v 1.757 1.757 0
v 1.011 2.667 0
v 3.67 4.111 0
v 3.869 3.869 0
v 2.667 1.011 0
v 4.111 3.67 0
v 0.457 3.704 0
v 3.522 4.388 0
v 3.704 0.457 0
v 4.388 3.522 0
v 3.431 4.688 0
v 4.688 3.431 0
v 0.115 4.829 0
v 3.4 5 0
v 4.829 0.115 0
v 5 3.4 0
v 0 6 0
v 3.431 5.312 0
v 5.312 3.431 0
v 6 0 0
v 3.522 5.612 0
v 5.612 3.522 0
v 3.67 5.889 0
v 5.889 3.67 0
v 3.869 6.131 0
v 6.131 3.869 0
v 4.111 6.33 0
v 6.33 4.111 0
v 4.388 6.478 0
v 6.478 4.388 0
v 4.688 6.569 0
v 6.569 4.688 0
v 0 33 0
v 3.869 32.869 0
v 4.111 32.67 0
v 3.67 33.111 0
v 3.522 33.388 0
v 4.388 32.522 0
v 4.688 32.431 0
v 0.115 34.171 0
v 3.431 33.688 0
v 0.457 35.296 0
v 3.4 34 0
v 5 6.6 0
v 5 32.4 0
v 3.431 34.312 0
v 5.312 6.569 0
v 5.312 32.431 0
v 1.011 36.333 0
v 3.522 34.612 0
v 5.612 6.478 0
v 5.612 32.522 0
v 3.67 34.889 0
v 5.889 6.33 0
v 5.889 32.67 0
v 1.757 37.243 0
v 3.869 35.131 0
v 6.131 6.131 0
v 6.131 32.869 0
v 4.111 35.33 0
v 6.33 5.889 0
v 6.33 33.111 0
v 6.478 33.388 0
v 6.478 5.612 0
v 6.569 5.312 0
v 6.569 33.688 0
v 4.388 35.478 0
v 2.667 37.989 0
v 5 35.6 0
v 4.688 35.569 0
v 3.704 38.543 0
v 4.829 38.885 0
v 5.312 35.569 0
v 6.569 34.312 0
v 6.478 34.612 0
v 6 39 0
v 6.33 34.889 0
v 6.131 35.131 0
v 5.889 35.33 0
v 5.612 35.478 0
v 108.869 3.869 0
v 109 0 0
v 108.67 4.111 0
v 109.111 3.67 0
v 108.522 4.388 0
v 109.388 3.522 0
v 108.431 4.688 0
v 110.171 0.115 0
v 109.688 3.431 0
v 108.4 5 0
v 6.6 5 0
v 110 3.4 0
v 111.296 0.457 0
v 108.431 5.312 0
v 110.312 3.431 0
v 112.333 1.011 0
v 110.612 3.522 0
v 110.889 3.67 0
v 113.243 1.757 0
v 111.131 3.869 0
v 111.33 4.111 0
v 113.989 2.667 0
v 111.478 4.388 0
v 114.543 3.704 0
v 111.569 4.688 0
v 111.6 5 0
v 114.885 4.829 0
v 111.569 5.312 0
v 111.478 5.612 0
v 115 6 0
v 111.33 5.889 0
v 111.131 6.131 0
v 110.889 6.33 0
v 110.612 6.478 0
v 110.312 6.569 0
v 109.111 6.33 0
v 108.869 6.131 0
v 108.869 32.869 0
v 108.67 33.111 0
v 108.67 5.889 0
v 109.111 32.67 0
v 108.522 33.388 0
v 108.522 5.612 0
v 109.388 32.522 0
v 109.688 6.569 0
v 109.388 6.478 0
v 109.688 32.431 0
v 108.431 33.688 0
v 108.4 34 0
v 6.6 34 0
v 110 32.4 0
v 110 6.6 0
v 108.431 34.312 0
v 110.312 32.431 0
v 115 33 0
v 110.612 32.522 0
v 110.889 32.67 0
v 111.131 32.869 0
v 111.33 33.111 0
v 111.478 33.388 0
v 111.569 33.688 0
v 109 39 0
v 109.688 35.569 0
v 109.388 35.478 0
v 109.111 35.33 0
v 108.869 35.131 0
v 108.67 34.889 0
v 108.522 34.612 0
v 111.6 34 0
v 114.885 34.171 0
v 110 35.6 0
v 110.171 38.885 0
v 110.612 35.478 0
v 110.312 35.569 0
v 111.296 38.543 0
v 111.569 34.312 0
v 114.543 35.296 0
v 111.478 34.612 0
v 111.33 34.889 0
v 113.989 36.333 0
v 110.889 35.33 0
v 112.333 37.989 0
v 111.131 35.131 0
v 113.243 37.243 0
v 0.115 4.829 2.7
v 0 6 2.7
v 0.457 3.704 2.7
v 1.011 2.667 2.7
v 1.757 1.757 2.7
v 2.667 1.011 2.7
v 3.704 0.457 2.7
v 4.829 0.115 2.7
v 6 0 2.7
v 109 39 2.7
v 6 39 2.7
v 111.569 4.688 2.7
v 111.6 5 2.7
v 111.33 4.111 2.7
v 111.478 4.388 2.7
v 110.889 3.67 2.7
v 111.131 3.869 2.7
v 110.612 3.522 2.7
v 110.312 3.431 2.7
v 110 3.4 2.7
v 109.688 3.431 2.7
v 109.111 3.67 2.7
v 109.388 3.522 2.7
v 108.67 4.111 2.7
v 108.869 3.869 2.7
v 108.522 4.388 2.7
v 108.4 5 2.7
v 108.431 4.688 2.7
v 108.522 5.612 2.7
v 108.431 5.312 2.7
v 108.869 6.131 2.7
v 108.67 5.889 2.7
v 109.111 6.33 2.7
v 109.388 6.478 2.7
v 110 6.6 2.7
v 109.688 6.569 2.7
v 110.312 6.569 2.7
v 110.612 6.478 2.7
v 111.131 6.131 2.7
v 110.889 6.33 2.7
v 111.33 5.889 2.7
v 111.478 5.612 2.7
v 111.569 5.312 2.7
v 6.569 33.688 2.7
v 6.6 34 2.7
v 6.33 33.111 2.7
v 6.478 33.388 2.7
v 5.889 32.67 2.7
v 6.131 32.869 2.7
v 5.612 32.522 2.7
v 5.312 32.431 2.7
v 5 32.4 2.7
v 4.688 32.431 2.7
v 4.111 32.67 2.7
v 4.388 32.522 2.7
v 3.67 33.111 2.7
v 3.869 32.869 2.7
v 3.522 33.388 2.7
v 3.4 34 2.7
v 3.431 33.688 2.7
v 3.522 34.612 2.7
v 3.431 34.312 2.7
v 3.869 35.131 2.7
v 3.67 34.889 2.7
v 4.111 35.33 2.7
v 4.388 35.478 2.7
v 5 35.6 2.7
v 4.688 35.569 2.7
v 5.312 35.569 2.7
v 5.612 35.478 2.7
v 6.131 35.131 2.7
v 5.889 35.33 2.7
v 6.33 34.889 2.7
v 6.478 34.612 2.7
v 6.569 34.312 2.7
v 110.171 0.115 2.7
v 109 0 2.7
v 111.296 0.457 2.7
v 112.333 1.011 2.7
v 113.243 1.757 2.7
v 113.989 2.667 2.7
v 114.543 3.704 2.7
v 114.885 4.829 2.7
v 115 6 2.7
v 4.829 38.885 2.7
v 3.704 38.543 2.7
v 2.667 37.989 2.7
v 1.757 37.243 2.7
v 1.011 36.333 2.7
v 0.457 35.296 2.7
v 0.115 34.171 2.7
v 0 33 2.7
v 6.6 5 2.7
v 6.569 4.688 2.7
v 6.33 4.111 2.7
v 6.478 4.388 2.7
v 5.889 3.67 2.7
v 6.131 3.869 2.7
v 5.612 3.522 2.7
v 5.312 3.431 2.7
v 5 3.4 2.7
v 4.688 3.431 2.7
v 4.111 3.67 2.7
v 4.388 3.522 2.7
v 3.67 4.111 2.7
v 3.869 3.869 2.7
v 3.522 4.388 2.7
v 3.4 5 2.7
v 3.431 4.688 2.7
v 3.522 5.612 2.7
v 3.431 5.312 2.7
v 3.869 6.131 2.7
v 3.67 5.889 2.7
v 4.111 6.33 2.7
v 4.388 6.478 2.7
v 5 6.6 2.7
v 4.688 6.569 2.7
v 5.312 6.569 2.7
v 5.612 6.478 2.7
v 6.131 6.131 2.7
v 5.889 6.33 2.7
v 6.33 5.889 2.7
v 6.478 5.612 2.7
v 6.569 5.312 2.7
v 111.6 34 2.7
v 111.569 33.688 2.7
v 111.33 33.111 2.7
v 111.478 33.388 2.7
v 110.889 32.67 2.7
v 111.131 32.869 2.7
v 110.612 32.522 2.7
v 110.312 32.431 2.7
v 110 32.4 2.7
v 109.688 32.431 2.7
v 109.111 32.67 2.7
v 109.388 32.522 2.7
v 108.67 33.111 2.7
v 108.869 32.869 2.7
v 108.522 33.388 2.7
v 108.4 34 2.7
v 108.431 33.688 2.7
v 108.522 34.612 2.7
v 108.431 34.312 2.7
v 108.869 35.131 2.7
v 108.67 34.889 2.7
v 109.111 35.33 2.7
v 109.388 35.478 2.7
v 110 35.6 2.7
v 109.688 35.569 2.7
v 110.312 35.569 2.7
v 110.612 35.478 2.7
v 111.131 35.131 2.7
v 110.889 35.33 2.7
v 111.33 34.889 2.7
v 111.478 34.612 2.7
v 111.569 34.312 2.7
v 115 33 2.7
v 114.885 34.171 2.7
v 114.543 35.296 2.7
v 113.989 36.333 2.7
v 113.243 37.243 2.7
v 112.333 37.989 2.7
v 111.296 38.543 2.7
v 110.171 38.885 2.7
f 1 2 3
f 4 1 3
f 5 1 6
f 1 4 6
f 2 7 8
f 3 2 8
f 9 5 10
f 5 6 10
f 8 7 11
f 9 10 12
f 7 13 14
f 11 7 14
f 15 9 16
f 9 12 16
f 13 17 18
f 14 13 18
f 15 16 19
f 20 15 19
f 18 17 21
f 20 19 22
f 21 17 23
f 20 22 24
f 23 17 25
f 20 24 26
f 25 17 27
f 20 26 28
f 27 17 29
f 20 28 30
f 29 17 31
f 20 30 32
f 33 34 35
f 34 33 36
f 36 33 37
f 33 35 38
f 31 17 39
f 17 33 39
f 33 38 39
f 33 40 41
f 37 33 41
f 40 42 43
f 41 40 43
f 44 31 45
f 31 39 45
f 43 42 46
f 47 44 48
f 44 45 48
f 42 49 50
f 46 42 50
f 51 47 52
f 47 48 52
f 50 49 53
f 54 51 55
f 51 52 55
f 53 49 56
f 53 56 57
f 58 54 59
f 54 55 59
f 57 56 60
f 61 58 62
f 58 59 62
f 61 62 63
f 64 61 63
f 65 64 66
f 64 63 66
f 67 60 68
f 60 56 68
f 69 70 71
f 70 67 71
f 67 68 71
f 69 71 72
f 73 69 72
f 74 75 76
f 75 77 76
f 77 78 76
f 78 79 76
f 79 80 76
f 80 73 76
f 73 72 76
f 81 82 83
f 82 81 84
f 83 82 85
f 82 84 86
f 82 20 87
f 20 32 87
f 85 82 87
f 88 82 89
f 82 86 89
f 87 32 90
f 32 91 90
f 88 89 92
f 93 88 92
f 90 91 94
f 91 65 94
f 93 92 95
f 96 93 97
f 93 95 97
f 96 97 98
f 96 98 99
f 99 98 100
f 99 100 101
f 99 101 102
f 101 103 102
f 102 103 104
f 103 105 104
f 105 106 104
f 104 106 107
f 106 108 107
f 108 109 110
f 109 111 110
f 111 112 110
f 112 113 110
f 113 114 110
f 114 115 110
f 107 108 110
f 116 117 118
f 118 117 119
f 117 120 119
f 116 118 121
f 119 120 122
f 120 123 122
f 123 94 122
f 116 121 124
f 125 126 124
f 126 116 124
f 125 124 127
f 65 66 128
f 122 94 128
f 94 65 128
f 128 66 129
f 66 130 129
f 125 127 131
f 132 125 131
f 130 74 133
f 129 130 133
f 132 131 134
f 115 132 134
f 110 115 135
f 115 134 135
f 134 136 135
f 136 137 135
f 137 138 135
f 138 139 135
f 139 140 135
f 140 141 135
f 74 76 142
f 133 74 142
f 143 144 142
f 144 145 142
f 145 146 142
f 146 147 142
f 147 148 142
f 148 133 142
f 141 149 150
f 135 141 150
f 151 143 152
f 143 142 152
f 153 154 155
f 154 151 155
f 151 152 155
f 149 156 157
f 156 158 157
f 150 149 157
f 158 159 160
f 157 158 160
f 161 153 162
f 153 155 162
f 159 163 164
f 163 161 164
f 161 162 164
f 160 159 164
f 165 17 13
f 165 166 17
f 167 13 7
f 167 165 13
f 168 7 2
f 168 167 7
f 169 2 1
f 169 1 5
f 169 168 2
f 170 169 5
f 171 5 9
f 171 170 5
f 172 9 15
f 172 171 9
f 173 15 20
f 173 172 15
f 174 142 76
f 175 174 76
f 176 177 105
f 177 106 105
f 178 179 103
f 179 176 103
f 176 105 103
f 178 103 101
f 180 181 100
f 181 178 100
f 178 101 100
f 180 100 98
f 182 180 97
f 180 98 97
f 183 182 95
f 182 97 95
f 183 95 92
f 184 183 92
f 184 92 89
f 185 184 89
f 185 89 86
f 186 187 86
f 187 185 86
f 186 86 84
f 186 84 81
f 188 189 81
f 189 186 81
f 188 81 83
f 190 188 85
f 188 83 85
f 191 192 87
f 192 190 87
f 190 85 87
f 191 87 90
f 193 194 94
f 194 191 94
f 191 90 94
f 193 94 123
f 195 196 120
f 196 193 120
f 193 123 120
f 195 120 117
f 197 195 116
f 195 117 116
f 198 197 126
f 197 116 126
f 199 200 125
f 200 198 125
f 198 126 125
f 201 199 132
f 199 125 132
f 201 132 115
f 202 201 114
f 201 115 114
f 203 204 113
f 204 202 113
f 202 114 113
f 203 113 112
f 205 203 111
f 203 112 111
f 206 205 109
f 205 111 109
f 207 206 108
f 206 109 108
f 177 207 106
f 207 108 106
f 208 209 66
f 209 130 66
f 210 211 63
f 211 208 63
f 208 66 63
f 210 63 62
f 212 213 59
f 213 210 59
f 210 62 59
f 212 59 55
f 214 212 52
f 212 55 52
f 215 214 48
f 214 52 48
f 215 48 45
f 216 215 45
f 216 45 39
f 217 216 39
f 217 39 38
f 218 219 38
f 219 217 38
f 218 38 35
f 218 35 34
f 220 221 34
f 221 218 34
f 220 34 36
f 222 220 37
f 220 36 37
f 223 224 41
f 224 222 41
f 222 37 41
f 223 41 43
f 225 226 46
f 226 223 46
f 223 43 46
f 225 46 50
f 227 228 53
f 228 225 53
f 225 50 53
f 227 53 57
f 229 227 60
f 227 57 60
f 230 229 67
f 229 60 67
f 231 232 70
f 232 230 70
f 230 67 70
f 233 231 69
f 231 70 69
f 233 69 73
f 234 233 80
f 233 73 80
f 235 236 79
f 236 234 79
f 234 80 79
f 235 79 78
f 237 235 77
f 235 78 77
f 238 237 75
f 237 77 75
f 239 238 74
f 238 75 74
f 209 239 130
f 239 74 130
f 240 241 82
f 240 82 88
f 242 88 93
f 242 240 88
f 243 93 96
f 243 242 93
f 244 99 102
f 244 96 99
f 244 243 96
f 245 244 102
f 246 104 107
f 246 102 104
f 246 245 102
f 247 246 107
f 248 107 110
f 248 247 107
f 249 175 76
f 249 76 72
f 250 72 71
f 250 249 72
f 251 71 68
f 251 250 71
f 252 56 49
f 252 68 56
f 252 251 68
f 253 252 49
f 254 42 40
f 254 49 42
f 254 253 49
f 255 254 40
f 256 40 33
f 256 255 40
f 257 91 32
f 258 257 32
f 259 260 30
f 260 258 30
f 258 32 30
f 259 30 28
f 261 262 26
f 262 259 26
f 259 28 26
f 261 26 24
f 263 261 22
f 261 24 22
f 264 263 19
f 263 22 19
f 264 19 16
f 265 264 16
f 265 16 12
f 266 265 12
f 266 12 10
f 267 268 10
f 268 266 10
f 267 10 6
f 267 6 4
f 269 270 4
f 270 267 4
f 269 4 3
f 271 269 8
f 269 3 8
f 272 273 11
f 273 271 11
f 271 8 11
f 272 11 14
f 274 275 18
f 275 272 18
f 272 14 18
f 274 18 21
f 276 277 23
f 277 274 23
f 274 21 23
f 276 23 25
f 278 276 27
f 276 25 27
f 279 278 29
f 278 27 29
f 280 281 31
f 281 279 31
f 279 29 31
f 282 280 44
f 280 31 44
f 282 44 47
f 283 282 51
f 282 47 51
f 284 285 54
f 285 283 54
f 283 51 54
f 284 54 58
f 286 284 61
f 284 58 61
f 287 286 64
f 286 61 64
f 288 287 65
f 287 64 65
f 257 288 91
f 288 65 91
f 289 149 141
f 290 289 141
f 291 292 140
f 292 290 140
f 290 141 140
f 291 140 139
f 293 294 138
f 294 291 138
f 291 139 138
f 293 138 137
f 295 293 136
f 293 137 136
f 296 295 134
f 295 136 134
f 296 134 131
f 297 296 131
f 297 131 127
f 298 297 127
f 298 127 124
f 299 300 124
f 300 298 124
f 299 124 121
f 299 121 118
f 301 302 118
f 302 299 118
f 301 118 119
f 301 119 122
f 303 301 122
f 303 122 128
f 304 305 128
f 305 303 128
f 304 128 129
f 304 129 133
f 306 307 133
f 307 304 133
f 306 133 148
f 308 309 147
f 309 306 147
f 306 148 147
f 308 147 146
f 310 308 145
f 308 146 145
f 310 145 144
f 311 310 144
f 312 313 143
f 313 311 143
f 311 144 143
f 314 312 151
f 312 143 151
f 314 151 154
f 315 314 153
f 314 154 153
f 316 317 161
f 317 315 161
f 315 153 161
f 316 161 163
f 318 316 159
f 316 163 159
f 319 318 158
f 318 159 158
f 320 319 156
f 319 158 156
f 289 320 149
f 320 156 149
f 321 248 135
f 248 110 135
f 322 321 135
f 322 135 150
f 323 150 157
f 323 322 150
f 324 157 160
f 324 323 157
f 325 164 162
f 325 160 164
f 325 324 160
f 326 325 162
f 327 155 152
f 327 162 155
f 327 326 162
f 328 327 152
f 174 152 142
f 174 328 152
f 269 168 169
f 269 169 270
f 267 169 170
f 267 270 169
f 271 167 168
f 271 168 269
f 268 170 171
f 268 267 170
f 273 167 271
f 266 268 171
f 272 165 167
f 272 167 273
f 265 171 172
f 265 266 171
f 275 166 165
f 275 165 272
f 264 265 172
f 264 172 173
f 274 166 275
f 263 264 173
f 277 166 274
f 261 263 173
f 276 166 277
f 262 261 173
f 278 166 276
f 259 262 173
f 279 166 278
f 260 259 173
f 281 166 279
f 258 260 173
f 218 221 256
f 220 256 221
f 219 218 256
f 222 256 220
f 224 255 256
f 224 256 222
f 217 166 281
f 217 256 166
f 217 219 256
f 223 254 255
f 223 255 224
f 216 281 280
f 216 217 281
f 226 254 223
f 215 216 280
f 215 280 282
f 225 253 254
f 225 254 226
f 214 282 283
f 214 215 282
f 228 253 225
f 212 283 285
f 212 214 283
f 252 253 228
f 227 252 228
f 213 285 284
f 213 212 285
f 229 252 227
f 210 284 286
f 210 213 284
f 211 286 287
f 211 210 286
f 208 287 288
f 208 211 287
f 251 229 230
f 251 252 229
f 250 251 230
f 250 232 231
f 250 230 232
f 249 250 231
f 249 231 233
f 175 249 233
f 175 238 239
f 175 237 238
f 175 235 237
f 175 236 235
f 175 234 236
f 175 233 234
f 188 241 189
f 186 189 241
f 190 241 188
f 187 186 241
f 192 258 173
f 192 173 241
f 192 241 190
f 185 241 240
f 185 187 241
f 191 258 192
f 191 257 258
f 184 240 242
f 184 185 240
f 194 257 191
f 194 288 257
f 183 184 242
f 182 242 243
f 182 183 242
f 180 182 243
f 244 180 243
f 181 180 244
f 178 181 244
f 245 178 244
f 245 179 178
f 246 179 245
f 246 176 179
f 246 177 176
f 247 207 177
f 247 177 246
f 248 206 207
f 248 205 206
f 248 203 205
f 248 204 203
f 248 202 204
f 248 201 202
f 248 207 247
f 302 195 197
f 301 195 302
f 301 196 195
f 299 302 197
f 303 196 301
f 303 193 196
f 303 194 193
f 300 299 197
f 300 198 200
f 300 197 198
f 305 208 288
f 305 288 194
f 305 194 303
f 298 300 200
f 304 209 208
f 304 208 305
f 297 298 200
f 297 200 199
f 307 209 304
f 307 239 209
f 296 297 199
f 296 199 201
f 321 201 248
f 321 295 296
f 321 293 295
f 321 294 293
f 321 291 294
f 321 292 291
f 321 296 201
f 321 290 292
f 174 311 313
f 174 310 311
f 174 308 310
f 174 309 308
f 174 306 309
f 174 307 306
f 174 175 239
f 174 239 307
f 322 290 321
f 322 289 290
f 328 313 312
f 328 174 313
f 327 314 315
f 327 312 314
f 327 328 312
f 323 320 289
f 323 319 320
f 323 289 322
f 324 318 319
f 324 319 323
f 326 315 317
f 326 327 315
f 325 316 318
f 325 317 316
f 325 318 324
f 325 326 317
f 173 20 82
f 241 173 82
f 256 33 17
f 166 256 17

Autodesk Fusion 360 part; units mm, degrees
sketch "Sketch1" plane through (0, 0, 0) normal (0, 0, 1) x (1, 0, 0)
  line L0 (0, 0) -> (115, 0)
  line L1 (115, 0) -> (115, 39)
  line L2 (115, 39) -> (0, 39)
  line L3 (0, 39) -> (0, 0)
  circle A0 centre (5, 34) radius 1.6
  circle A1 centre (5, 5) radius 1.6
  circle A2 centre (110, 5) radius 1.6
  circle A3 centre (110, 34) radius 1.6
  dimension "d1" = 115
  dimension "d2" = 39
  dimension "d3" = 3.2
  dimension "d4" = 5
  dimension "d5" = 5
  dimension "d6" = 3.2
  dimension "d7" = 5
  dimension "d8" = 5
  dimension "d9" = 3.2
  dimension "d10" = 3.2
  dimension "d11" = 5
  dimension "d12" = 5
  dimension "d13" = 5
  dimension "d14" = 5
extrude "Extrude1" add sketch "Sketch1" along normal blind 2.7
fillet "Fillet1" radius 6 4 edges at (115, 39, 1.35) (115, 0, 1.35) (0, 39, 1.35) (0, 0, 1.35)
